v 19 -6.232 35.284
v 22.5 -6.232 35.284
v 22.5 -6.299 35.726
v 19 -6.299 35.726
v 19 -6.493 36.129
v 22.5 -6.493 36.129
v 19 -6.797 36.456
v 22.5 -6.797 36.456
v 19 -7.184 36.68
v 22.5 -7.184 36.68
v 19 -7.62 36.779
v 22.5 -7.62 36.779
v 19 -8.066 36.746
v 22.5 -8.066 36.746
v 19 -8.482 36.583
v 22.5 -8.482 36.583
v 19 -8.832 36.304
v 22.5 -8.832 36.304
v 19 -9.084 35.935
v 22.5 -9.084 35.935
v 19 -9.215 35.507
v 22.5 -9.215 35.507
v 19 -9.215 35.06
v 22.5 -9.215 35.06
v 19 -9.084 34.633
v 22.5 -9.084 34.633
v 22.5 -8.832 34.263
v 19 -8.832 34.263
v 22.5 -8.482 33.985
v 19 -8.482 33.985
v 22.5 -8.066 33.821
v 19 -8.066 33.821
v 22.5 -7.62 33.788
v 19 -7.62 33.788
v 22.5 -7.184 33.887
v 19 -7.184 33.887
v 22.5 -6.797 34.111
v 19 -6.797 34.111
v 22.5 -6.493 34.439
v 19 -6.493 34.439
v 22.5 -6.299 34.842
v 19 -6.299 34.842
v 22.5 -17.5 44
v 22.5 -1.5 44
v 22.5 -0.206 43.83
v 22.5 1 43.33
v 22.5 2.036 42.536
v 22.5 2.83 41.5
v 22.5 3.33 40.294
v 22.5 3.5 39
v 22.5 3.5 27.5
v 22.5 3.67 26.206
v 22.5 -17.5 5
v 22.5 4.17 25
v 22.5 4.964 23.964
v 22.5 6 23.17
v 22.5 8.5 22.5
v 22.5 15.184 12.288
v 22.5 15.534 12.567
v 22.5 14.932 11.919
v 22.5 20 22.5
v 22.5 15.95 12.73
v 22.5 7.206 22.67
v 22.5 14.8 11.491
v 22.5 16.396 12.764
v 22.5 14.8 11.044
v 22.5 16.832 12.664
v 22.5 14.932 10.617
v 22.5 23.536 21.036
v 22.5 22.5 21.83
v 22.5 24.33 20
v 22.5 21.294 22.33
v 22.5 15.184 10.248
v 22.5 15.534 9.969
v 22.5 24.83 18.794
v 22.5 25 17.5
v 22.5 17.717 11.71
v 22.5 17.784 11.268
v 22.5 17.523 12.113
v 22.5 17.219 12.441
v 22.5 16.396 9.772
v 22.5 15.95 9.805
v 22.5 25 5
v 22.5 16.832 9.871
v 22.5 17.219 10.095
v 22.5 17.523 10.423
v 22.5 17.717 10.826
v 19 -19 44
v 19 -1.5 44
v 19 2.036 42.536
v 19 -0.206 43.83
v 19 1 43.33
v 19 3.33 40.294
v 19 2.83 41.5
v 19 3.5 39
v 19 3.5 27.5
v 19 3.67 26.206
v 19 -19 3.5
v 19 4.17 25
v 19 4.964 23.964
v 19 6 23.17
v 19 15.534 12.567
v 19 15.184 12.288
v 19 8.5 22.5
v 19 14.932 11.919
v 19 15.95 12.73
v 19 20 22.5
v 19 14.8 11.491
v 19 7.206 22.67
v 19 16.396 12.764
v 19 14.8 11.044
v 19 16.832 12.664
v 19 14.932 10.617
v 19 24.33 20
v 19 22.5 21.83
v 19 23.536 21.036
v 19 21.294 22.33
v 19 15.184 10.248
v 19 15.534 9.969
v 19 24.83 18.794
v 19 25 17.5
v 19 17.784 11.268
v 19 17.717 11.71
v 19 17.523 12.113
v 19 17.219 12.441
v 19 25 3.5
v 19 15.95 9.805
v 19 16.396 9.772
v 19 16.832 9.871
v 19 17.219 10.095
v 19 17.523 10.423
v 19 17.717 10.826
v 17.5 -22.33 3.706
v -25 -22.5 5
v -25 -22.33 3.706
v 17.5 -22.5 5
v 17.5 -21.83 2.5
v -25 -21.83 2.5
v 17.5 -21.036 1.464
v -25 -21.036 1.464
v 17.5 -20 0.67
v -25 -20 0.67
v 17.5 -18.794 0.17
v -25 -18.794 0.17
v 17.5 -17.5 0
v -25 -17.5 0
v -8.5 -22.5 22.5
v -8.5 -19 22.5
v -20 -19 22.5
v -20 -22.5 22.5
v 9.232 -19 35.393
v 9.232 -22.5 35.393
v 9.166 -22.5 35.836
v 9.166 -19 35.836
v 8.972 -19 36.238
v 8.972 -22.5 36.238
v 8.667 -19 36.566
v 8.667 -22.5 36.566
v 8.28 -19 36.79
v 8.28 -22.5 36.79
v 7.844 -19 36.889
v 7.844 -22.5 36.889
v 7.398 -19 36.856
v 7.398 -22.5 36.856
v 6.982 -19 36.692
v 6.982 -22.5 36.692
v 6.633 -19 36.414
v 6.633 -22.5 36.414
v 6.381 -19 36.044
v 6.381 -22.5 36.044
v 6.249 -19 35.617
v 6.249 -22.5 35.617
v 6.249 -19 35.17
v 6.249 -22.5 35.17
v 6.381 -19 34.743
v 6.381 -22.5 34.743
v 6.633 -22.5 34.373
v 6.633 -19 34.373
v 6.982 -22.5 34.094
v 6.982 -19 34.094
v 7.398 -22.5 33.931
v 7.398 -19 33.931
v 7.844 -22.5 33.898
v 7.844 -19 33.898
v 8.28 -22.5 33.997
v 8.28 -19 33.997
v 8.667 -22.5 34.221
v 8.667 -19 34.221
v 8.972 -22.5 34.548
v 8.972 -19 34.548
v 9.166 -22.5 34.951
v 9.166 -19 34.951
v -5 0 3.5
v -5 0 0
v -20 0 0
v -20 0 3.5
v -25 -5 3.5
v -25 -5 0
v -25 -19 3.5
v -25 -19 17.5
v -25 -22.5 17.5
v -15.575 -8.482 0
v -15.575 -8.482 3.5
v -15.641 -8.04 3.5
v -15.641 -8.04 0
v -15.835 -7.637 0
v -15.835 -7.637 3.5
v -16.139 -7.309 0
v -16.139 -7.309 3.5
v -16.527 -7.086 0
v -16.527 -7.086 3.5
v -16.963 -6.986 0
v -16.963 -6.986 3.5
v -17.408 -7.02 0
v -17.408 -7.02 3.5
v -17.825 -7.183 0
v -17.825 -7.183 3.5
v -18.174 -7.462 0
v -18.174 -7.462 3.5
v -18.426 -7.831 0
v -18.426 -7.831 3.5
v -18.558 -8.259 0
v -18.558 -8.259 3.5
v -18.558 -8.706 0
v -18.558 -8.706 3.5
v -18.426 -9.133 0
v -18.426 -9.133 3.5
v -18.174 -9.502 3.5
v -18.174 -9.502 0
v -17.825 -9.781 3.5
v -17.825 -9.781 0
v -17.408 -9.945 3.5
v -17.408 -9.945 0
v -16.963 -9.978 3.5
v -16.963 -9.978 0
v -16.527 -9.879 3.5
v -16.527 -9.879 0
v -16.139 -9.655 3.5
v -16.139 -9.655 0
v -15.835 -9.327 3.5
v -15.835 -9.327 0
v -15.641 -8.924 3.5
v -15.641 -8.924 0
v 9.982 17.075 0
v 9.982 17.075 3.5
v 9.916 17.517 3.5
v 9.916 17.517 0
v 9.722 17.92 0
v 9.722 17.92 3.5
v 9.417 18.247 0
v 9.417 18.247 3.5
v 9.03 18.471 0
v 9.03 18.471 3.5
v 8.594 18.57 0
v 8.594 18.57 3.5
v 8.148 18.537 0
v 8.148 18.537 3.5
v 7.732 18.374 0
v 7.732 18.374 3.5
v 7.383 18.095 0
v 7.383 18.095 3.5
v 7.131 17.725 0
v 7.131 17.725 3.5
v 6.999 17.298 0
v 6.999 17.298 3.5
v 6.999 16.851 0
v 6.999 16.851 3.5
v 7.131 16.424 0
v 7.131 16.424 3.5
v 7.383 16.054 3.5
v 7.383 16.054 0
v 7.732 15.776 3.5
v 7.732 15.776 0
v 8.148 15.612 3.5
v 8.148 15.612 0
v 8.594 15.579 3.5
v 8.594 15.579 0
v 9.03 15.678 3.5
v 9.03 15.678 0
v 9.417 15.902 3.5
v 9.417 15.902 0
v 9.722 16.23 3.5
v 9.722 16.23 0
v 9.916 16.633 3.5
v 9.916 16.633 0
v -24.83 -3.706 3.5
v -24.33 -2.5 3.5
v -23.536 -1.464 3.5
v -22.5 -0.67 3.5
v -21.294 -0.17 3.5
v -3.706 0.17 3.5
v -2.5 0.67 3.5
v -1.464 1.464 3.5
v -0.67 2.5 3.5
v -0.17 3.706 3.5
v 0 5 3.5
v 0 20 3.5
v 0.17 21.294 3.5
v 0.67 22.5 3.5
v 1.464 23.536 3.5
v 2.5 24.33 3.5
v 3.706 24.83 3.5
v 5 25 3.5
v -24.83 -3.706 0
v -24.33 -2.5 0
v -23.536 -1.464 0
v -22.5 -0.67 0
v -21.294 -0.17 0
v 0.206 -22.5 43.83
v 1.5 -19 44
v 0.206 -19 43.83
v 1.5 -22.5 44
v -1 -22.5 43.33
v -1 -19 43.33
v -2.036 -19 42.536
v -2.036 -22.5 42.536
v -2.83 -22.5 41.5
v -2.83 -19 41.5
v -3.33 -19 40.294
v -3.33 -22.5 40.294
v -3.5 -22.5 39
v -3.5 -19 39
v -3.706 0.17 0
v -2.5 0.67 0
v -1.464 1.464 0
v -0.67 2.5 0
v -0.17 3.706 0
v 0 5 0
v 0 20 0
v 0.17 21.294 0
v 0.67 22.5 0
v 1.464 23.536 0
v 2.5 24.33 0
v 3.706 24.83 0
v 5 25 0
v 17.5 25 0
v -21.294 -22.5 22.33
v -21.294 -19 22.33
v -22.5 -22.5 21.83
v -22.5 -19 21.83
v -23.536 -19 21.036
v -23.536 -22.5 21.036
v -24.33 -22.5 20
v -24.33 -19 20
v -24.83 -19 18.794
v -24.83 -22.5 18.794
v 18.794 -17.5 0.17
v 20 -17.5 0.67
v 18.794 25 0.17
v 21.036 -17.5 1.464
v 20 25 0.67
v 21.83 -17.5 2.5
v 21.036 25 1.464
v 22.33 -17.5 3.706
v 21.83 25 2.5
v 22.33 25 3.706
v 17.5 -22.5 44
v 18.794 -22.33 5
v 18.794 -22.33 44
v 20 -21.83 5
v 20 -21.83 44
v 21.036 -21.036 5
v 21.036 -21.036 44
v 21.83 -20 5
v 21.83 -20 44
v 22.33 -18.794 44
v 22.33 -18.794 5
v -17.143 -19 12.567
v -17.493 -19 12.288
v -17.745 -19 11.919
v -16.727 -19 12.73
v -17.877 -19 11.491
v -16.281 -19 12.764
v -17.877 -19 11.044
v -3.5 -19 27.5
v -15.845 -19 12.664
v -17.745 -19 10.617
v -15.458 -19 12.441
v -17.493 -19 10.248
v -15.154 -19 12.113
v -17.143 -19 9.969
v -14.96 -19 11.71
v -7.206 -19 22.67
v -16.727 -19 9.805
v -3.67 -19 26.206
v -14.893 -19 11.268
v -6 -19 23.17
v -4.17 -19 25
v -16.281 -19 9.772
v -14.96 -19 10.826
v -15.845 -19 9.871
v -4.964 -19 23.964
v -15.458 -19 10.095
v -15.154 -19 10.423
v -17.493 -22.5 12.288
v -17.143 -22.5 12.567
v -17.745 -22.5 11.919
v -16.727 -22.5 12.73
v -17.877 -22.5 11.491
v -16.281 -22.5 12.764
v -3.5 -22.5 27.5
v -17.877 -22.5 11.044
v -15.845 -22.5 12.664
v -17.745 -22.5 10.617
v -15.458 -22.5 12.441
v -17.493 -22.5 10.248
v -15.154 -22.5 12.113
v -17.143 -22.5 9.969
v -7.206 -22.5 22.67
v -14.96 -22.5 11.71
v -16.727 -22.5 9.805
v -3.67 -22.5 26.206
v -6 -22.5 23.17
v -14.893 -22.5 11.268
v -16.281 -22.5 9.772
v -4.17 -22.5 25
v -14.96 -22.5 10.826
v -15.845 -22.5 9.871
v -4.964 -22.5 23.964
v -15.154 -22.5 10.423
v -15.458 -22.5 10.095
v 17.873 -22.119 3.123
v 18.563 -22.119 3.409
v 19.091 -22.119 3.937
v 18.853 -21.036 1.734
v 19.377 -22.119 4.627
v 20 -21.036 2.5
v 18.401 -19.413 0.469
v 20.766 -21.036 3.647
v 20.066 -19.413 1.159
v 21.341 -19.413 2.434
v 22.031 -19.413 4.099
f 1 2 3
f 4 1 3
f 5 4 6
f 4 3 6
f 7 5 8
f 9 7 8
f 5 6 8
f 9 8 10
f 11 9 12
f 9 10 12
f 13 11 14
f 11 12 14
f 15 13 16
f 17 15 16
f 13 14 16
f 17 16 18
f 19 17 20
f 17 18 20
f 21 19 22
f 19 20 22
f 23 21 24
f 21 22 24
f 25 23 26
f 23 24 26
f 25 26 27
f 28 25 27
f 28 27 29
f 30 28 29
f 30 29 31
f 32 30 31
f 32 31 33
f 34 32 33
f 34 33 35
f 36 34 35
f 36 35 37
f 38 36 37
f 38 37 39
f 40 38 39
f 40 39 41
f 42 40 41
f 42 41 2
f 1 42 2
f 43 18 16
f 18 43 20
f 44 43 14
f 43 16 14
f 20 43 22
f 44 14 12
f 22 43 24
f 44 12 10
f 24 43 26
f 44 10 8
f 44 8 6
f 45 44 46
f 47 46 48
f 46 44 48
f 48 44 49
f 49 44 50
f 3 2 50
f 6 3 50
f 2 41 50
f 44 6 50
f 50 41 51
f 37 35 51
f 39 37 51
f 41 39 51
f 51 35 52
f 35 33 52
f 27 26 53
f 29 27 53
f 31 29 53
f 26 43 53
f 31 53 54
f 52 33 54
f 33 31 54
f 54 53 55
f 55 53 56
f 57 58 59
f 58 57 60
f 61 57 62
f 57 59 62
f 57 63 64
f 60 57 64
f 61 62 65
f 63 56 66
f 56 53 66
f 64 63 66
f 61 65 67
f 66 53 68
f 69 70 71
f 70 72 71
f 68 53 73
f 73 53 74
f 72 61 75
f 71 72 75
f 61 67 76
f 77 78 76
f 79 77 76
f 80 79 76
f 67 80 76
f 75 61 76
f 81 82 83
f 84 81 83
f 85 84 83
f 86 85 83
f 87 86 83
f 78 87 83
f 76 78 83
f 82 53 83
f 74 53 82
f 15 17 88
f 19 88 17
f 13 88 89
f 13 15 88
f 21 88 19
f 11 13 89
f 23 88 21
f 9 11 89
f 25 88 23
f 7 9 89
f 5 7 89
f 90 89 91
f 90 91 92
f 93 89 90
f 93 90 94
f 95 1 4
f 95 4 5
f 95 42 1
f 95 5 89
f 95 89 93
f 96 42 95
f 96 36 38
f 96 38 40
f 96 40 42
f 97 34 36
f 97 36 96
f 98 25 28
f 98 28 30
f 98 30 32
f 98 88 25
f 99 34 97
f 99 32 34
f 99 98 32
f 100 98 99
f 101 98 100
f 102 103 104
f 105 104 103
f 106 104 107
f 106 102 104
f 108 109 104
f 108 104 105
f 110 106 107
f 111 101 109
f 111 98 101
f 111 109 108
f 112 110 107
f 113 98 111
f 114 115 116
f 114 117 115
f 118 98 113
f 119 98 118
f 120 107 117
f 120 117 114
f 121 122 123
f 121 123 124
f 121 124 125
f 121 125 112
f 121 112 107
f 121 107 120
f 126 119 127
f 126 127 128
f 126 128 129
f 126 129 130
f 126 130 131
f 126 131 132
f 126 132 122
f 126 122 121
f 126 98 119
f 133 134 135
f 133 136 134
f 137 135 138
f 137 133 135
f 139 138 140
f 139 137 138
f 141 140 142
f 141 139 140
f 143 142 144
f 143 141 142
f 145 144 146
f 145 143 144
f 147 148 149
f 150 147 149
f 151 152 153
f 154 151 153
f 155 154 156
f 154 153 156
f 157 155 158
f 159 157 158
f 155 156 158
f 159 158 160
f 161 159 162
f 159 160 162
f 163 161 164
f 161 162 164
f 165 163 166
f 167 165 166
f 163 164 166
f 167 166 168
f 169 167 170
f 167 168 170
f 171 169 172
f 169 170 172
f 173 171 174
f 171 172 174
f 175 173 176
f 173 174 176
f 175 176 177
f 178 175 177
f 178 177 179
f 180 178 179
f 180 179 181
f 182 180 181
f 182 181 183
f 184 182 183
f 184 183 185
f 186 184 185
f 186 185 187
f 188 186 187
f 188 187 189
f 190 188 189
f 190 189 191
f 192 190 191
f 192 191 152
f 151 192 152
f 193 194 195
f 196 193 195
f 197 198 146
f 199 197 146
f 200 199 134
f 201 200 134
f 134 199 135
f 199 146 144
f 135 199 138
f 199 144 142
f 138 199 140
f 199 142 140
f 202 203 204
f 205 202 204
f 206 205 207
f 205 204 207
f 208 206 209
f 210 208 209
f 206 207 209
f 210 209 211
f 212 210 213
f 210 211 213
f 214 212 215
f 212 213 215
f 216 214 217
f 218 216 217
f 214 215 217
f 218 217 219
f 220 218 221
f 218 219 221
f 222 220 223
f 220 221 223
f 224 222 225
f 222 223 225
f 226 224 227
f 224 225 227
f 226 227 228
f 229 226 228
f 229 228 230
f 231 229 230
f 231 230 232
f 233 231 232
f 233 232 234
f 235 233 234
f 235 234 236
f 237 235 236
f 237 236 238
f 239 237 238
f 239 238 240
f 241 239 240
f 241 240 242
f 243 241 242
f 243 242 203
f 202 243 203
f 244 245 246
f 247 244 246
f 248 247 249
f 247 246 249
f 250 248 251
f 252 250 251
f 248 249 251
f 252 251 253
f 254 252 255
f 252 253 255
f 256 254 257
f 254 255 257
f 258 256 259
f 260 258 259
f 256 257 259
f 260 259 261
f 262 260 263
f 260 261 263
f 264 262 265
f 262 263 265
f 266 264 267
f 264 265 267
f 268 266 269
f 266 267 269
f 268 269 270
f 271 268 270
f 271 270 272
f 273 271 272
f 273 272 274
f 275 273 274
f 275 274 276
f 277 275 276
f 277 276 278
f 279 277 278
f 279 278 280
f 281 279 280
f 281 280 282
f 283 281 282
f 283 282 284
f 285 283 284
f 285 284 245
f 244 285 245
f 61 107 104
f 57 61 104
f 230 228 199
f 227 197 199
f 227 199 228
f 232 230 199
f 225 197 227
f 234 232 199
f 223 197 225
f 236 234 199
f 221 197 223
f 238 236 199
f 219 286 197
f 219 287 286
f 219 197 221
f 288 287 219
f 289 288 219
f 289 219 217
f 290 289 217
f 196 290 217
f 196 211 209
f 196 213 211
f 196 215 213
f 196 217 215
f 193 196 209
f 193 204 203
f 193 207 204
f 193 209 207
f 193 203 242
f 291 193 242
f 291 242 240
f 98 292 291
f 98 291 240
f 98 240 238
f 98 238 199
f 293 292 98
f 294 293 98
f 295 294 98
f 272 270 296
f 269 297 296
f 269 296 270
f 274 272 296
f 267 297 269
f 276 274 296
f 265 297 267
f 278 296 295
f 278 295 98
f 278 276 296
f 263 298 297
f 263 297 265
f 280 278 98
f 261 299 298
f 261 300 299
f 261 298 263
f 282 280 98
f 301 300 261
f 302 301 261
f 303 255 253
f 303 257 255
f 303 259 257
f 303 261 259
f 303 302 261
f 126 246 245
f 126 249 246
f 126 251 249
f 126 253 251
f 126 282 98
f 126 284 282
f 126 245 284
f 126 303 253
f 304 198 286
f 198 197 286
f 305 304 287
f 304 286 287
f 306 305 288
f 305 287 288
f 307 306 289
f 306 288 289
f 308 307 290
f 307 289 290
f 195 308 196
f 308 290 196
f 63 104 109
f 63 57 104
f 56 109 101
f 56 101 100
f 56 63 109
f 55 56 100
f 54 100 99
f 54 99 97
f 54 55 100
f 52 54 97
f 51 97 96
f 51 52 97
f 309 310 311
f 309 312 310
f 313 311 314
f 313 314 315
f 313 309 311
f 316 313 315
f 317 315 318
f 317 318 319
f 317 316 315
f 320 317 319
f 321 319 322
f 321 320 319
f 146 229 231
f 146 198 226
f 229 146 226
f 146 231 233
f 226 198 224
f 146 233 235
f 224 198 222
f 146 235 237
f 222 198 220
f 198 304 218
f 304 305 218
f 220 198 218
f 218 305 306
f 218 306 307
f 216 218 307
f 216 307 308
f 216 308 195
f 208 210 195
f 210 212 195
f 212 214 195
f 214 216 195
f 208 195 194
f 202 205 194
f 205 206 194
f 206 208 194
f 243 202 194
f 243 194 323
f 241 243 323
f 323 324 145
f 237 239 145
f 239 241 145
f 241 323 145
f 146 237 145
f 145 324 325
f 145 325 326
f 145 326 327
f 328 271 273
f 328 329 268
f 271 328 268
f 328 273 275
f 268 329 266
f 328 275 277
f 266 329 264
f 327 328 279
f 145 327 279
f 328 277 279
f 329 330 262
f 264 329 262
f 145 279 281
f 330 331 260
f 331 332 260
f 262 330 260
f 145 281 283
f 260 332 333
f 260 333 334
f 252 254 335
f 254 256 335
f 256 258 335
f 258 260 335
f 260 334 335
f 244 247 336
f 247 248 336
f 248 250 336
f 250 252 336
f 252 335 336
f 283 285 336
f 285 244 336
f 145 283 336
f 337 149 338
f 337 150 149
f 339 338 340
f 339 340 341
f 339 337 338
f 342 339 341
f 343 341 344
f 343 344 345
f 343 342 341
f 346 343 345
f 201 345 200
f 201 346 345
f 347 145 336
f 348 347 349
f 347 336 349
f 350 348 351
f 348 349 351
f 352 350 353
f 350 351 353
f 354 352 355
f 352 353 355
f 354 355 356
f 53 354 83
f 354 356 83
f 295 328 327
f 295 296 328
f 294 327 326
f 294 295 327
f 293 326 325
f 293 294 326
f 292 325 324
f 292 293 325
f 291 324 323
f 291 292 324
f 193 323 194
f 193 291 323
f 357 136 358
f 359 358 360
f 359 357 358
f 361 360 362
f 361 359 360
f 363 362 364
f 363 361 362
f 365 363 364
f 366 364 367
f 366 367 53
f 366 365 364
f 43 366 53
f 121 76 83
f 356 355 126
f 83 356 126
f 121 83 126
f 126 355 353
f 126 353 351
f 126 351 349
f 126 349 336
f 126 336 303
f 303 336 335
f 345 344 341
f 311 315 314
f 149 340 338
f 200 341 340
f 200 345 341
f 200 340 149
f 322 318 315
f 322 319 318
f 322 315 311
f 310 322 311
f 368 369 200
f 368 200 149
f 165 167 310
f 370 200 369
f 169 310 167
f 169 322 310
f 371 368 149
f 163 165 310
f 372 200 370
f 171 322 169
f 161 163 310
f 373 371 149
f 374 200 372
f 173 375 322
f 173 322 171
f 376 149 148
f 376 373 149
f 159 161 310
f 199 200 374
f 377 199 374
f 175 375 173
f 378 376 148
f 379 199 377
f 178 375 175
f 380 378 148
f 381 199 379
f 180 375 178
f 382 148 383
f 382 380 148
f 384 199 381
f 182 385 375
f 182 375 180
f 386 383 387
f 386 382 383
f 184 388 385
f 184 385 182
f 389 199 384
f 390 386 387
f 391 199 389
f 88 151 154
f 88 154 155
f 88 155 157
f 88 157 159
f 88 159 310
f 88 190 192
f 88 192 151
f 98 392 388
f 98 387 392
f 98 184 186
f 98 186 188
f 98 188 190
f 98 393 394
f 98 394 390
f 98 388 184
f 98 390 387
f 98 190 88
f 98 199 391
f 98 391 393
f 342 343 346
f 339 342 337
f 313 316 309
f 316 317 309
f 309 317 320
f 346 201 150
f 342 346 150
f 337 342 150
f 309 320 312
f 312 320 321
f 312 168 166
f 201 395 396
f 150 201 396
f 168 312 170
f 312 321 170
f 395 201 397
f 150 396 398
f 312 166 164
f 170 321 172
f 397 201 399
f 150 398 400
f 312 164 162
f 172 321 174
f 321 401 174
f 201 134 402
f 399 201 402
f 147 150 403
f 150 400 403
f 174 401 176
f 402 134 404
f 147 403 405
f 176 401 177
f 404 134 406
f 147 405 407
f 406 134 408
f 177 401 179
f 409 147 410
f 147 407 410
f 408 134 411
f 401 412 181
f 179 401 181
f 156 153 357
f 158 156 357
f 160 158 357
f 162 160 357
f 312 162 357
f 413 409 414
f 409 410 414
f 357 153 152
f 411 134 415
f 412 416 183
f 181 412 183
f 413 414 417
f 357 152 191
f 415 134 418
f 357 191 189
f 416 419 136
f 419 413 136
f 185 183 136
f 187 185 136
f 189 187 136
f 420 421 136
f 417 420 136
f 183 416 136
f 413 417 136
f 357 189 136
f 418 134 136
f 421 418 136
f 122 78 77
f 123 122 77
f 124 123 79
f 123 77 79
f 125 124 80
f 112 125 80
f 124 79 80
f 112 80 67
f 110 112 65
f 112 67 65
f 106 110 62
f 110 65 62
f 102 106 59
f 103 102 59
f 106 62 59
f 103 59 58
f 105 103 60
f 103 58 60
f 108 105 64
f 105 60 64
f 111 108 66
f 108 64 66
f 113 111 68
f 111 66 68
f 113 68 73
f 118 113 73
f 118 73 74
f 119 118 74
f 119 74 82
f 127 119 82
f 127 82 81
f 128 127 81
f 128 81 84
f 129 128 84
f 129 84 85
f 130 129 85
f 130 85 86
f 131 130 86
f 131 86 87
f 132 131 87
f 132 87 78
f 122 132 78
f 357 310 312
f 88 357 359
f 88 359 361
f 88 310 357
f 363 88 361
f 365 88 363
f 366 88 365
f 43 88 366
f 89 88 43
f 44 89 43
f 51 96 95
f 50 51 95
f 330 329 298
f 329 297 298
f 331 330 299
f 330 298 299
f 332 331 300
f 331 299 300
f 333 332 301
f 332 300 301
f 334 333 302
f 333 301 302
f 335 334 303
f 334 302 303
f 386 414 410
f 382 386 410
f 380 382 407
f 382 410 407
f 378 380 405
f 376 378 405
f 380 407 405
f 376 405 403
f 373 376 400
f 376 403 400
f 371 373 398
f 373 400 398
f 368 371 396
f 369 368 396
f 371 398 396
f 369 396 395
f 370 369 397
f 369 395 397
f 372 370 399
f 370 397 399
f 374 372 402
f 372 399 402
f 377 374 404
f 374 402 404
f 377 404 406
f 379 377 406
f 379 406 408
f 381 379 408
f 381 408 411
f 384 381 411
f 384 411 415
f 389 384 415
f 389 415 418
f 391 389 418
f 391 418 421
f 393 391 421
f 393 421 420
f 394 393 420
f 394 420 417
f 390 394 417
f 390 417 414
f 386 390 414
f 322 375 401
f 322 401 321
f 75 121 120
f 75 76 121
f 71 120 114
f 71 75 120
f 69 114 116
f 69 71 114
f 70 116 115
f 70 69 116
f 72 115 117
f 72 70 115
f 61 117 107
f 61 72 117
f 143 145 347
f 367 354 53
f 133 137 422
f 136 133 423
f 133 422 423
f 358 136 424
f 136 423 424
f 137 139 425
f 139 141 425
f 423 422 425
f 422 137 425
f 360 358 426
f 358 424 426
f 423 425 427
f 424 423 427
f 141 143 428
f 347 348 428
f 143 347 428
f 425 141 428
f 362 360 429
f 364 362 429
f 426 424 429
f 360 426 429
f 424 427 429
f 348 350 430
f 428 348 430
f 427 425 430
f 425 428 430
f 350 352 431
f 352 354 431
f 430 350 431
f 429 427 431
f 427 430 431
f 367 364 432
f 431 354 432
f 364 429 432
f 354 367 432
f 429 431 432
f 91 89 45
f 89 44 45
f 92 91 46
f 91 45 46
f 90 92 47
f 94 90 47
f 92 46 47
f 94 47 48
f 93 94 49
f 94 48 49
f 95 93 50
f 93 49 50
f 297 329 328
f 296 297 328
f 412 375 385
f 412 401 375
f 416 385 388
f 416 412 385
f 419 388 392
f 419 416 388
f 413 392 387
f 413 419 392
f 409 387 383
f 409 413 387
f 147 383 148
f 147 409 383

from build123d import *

# Parameters (mm, degrees)
F1_DEPTH  = 44
F2_T      = -3.5
F3_W      = 21.5
F3_H      = 21.5
F4_DEPTH  = 25
F5_W      = 21.5
F5_H      = 21.5
F6_DEPTH  = 25
F7_R      = 5
F10_R     = 1.5
F11_DEPTH = 25
F9_R      = 1.5
F12_DEPTH = 25
F8_R      = 1.5
F13_DEPTH = 25


with BuildPart() as f1:
    # F0 (on Top) → F1 (new body)
    with BuildSketch(Plane.XY):
        Polygon((0, 25), (0, 0), (-25, 0), (-25, -22.5), (0, -22.5), (22.5, -22.5), (22.5, 0), (22.5, 25), align=None)
    extrude(amount=F1_DEPTH)

    # F2
    f2_openings = [f1.faces().sort_by_distance(p)[0] for p in [
        (3.060345, -3.060345, 44),
        (0, 12.5, 22),
        (-12.5, 0, 22),
        (-25, -11.25, 22),
        (11.25, 25, 22),
    ]]
    offset(amount=F2_T, openings=f2_openings)

    # F3 (on face) → F4 (cut)
    with BuildSketch(Plane(origin=(19, 0, 0), x_dir=(0, -1, 0), z_dir=(-1, 0, 0))):
        with Locations((-14.25, 33.25)):
            Rectangle(F3_W, F3_H)
    extrude(amount=-F4_DEPTH, mode=Mode.SUBTRACT)

    # F5 (on face) → F6 (cut)
    with BuildSketch(Plane(origin=(0, -19, 0), x_dir=(-1, 0, 0), z_dir=(0, 1, 0))):
        with Locations((14.25, 33.25)):
            Rectangle(F5_W, F5_H)
    extrude(amount=-F6_DEPTH, mode=Mode.SUBTRACT)

    # F7
    f7_edges = [f1.edges().sort_by_distance(p)[0] for p in [
        (22.5, 1.25, 0),
        (-1.25, -22.5, 0),
        (22.5, -22.5, 22),
        (0, 0, 1.75),
        (-3.5, -20.75, 22.5),
        (0, 25, 1.75),
        (20.75, 25, 22.5),
        (-3.5, -20.75, 44),
        (-25, -20.75, 22.5),
        (-25, 0, 1.75),
        (20.75, 3.5, 22.5),
        (20.75, 3.5, 44),
    ]]
    fillet(f7_edges, radius=F7_R)

    # F10 (on face) → F11 (cut)
    with BuildSketch(Plane.XZ.offset(22.5)):
        with Locations((7.732233047, 35.3934139763)):
            Circle(F10_R)
        with Locations((-16.3934139763, 11.267766953)):
            Circle(F10_R)
    extrude(amount=-F11_DEPTH, mode=Mode.SUBTRACT)

    # F9 (on face) → F12 (cut)
    with BuildSketch(Plane.YZ.offset(22.5)):
        with Locations((-7.732233047, 35.2836836879)):
            Circle(F9_R)
        with Locations((16.2836836879, 11.267766953)):
            Circle(F9_R)
    extrude(amount=-F12_DEPTH, mode=Mode.SUBTRACT)

    # F8 (on face) → F13 (cut)
    with BuildSketch(Plane.XY.offset(3.5)):
        with Locations((-17.0746488054, -8.482233047)):
            Circle(F8_R)
        with Locations((8.482233047, 17.0746488054)):
            Circle(F8_R)
    extrude(amount=-F13_DEPTH, mode=Mode.SUBTRACT)


solid = f1.part
